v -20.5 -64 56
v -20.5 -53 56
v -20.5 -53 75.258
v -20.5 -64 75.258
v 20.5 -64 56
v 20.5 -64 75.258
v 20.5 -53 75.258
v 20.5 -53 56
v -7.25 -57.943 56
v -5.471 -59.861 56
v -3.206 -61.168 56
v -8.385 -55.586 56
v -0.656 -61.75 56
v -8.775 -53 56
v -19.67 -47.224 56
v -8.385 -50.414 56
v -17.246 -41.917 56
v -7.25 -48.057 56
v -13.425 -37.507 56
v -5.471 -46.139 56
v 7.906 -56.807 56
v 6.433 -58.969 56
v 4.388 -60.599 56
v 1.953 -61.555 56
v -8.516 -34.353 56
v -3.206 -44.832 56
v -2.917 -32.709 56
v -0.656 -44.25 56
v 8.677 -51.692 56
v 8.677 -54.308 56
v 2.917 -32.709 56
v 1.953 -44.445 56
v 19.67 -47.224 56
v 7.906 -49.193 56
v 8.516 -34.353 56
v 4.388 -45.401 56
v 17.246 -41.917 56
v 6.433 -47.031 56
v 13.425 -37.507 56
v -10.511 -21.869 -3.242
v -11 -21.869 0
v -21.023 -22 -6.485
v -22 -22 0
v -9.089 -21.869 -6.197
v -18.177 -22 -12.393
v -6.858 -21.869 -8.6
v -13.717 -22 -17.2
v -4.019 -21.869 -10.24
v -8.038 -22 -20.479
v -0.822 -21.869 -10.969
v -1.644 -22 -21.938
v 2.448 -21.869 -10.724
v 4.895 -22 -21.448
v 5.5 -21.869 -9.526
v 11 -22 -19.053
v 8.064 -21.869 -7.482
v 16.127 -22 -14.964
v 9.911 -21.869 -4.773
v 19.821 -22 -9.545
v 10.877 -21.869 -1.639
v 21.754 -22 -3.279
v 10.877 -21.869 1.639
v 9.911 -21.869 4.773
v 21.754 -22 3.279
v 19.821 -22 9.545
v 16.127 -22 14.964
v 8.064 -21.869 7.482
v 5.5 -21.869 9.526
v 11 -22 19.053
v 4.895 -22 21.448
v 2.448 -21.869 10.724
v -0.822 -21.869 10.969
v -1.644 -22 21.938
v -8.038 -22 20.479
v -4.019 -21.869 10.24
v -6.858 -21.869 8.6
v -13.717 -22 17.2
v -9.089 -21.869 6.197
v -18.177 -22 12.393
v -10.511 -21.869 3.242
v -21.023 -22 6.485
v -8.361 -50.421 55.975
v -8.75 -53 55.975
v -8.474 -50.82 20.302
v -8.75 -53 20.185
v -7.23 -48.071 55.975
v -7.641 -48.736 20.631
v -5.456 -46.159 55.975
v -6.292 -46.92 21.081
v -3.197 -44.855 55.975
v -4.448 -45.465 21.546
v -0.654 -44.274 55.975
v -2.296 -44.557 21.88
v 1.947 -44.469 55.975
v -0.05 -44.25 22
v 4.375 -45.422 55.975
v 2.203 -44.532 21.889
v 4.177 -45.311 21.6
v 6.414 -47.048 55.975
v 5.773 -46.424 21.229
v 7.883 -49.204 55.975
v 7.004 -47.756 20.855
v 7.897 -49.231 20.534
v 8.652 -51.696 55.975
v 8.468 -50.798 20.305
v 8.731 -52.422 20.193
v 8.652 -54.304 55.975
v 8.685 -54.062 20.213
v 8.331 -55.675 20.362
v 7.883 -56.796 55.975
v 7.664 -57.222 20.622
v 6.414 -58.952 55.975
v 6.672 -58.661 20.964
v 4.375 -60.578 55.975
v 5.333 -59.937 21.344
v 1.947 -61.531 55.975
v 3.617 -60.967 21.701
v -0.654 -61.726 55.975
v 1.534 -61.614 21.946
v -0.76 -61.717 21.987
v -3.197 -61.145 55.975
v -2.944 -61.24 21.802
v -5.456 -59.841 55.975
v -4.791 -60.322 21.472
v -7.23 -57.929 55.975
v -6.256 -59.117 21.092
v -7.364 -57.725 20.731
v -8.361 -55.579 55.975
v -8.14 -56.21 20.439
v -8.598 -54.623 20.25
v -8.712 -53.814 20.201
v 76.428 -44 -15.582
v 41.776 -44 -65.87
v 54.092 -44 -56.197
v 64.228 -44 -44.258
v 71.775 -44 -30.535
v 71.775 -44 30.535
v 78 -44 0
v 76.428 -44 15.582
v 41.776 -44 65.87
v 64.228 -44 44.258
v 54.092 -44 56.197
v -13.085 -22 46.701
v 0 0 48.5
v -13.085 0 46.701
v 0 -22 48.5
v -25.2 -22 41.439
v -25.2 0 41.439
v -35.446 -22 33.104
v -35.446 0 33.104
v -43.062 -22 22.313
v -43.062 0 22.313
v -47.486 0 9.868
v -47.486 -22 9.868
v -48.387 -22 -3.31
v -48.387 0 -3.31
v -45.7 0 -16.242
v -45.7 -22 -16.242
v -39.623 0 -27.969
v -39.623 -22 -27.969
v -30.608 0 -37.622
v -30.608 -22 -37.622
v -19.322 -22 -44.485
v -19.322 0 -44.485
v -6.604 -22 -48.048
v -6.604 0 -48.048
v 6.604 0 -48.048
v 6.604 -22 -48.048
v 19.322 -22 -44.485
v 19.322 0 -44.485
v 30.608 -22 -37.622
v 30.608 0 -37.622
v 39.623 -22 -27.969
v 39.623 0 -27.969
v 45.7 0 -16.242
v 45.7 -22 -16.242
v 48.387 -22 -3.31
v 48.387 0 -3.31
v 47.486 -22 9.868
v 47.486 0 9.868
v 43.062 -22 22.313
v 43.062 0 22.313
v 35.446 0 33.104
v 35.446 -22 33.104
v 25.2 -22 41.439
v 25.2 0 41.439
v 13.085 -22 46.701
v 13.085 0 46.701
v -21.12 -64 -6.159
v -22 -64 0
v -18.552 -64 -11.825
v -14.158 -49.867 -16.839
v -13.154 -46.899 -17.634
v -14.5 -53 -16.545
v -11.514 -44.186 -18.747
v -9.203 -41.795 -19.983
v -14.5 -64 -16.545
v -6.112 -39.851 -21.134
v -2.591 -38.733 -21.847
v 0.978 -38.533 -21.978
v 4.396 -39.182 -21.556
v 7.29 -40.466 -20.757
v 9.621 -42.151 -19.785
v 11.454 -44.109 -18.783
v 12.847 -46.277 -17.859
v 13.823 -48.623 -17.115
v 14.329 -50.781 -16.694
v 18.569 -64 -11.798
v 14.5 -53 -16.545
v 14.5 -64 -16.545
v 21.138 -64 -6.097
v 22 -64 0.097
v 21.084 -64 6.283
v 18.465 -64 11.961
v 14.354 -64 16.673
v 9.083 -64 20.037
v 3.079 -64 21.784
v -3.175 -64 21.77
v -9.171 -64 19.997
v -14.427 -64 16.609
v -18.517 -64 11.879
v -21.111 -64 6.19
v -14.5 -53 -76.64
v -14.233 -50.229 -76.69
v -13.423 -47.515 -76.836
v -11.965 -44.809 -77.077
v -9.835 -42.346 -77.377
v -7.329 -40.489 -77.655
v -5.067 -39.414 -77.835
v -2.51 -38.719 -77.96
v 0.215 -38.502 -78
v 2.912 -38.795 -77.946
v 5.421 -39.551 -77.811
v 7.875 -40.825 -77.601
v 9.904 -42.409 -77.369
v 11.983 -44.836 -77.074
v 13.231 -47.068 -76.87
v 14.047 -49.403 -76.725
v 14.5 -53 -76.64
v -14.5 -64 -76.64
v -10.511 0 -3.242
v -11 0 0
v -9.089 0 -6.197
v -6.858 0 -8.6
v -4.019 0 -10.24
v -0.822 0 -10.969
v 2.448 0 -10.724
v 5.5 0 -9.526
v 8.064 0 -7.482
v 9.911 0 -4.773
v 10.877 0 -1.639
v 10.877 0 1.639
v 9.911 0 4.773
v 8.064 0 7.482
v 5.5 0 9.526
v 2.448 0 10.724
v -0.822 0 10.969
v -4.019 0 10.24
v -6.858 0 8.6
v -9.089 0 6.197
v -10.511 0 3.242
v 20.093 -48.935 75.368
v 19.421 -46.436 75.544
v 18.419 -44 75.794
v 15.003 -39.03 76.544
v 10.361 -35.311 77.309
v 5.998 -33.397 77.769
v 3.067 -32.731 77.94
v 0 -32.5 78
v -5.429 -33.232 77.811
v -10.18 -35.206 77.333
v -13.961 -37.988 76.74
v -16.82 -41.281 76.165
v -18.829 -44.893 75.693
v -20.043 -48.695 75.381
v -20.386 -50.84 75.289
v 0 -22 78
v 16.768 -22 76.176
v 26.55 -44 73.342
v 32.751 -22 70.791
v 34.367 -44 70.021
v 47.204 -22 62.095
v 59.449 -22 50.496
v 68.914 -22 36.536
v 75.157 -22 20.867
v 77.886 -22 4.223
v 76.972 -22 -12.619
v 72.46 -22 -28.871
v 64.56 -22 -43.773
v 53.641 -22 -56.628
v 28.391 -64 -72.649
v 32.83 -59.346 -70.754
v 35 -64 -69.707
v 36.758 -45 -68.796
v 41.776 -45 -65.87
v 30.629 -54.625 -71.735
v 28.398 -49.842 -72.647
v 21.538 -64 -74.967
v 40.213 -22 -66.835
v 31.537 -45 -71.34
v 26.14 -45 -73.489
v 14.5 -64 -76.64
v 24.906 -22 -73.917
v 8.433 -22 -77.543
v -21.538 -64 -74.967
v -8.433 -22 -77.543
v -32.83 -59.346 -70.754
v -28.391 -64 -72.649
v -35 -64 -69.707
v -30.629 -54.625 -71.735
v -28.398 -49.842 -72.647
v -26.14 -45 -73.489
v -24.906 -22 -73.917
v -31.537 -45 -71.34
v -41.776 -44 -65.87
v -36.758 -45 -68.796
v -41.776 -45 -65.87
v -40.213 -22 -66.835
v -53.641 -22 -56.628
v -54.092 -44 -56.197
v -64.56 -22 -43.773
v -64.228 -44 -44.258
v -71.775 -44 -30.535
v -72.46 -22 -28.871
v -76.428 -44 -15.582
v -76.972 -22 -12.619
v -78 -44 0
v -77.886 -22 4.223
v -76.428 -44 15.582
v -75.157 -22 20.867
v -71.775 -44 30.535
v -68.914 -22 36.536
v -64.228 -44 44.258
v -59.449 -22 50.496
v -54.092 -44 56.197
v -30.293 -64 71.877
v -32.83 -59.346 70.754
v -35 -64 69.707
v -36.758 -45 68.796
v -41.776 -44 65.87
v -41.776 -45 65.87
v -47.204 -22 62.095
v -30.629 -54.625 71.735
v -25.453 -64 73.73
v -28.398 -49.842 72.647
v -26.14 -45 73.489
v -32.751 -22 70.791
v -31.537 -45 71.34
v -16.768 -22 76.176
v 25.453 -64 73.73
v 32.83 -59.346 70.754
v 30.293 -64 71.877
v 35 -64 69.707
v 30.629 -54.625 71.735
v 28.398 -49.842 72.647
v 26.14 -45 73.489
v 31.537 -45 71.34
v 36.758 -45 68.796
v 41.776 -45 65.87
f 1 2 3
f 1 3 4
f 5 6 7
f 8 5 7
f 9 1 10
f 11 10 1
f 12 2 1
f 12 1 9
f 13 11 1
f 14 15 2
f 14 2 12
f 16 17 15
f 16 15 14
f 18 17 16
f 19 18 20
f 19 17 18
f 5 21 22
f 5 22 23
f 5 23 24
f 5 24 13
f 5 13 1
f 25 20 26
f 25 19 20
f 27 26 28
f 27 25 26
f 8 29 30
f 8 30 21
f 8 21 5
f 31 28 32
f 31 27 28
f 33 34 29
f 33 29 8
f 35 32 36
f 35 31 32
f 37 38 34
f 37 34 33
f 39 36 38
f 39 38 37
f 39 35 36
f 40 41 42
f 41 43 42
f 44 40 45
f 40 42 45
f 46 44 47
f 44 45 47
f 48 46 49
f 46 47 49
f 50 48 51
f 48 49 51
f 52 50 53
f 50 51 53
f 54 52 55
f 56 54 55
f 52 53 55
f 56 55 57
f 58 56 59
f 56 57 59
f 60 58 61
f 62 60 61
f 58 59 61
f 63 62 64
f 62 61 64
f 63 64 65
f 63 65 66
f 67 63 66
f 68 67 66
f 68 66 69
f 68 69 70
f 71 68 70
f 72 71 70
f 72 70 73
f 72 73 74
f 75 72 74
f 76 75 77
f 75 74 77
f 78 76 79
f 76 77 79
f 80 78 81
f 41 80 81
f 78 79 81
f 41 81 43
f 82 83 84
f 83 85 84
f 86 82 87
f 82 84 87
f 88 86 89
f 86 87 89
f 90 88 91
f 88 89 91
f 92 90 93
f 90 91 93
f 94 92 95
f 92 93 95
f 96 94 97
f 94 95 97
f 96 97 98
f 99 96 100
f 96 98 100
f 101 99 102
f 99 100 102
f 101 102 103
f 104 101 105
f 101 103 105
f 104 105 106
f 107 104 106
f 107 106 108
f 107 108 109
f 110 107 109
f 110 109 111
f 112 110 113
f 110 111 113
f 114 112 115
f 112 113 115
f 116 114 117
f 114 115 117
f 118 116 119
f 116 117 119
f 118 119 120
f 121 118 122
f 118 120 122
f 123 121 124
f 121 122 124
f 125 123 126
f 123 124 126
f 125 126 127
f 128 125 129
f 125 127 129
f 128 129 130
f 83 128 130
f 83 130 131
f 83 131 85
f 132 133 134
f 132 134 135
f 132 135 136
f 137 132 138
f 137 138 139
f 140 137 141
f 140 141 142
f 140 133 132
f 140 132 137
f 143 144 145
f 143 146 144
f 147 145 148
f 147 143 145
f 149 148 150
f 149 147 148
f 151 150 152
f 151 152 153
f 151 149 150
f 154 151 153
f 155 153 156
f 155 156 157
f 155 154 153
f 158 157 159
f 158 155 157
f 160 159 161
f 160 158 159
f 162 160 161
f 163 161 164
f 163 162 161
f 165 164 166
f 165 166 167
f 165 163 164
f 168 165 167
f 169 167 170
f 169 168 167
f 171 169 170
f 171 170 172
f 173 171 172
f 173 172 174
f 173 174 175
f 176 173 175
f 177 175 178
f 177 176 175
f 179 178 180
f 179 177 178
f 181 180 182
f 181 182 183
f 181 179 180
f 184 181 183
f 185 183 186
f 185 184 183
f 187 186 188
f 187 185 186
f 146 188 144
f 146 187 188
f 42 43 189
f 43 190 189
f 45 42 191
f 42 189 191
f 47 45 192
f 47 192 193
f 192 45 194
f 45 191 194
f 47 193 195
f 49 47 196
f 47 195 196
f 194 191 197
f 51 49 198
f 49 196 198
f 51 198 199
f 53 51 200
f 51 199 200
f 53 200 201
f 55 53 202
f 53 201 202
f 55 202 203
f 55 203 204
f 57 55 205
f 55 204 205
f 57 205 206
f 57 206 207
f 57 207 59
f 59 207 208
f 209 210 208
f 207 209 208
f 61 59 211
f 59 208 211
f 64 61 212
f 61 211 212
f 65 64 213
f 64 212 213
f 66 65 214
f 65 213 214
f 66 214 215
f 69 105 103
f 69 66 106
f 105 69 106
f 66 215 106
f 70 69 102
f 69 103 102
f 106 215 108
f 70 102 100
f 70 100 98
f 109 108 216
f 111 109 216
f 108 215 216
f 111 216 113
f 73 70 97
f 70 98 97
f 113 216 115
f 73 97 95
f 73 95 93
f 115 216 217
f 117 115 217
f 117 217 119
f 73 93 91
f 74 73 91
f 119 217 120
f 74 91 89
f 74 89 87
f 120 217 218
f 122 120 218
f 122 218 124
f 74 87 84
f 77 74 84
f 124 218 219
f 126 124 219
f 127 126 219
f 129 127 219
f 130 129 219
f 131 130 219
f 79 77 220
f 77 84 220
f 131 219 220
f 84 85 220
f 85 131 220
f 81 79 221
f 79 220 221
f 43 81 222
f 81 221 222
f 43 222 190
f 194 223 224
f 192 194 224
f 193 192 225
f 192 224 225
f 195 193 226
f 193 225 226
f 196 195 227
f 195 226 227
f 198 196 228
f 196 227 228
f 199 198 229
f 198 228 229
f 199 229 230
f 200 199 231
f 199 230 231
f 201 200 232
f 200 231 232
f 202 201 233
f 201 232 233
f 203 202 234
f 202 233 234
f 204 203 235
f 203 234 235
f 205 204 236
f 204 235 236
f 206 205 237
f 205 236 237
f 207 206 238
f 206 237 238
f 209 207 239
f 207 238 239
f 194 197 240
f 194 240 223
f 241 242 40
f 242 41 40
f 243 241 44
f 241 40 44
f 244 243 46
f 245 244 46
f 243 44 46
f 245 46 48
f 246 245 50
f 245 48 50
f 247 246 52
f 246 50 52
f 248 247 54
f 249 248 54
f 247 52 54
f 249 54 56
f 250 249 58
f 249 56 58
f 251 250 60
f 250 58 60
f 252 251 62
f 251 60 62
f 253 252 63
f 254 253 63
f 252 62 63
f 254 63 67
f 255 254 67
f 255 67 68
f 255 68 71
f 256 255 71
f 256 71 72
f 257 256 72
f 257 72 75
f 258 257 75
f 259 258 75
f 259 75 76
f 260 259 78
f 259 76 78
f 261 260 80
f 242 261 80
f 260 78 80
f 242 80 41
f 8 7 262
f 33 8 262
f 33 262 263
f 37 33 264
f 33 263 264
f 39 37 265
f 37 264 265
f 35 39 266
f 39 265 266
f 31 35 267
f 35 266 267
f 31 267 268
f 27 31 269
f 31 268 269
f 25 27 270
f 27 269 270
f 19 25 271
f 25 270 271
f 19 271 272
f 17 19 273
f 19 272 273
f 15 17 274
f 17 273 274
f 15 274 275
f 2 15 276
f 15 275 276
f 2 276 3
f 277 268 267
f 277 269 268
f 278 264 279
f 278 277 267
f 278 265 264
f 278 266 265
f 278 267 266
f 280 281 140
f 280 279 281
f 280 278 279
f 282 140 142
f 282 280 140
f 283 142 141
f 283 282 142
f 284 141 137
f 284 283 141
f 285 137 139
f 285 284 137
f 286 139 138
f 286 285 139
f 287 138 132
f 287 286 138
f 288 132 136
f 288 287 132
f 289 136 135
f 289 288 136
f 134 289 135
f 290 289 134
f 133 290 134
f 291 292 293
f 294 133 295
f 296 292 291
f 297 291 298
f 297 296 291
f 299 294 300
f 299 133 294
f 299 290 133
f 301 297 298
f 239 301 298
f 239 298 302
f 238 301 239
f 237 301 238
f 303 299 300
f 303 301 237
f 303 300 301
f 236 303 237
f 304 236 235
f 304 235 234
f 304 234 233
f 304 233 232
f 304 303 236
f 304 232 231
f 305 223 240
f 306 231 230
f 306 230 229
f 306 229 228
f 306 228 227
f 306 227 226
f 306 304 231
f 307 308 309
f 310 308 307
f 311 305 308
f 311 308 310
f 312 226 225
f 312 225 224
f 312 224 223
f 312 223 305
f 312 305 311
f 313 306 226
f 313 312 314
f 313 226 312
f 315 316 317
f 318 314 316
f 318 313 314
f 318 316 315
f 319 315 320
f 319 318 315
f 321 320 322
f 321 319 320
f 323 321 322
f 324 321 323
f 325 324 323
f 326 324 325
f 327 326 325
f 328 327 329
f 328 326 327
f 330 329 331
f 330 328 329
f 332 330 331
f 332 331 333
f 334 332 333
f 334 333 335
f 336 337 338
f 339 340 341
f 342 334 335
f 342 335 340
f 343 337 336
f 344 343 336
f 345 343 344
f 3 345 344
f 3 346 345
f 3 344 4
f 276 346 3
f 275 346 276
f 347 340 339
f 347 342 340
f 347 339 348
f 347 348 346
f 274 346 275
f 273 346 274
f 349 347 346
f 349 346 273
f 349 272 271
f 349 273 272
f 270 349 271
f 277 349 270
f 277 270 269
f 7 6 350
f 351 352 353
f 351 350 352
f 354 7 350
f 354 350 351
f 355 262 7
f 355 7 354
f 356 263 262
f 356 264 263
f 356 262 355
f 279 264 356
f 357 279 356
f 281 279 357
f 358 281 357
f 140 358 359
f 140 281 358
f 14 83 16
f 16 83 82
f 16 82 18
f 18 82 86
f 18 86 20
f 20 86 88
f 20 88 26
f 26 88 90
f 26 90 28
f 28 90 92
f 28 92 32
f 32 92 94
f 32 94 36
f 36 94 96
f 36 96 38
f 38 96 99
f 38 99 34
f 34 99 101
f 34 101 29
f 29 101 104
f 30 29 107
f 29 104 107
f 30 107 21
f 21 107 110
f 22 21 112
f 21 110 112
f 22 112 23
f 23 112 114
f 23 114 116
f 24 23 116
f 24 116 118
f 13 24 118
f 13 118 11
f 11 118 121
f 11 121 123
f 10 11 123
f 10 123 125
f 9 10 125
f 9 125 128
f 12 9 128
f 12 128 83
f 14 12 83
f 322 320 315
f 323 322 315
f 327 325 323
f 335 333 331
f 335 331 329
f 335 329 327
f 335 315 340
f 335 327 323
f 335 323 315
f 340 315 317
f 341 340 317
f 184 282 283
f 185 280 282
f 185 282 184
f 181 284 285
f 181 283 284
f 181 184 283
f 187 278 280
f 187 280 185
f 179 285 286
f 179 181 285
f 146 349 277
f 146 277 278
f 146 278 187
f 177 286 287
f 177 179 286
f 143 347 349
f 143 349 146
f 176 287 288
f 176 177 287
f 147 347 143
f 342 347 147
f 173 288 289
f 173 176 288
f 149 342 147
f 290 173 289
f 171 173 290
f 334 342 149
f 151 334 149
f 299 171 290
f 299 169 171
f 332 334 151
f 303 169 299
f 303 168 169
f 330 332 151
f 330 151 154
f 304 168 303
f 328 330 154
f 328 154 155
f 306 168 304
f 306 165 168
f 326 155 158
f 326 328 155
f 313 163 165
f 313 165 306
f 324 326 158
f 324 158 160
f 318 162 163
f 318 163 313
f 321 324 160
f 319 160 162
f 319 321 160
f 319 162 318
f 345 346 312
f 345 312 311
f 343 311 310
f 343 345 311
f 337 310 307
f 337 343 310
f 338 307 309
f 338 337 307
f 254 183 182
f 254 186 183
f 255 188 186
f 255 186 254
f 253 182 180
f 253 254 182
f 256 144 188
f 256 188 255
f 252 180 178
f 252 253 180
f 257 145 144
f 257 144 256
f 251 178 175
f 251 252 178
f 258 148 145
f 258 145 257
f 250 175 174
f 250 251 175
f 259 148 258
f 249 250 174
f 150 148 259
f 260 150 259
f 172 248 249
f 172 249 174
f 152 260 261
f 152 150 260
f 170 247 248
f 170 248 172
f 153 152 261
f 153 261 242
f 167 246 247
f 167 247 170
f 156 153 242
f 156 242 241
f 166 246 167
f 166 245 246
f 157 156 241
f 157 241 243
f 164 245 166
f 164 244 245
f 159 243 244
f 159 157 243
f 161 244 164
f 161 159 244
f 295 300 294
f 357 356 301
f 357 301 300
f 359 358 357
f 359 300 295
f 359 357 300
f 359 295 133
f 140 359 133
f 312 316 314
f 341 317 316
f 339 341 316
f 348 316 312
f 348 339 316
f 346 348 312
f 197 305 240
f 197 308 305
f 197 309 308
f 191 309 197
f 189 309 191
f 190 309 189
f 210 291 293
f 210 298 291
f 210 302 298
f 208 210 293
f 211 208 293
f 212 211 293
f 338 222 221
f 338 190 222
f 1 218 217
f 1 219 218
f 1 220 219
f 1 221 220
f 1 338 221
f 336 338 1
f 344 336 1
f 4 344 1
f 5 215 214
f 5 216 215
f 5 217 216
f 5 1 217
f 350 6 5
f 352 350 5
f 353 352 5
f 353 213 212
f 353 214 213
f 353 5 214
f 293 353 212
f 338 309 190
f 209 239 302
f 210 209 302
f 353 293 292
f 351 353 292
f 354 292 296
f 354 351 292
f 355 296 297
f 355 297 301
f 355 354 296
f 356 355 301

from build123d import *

# Parameters (mm, degrees)
Y_KSEKLIK_EKSTR_ZYON2_REACH                  = 120.76
Y_KSEKLIK_EKSTR_ZYON2_END_RADIUS             = 78
Y_KSEKLIK_EKSTR_ZYON2_DIRECTION_2_REACH      = 120.76
Y_KSEKLIK_EKSTR_ZYON2_DIRECTION_2_END_RADIUS = 78
KES_EKSTR_ZYON1_DEPTH                        = 22
M16_BO_LUKLU_DELIK2_D                        = 17.5
M16_BO_LUKLU_DELIK2_DEPTH                    = 55.999
M16_BO_LUKLU_DELIK2_CSINK_D                  = 17.55
M16_BO_LUKLU_DELIK2_CSINK_ANGLE              = 90
M16_BO_LUKLU_DELIK2_TIP                      = 5.257530416
KES_EKSTR_ZYON2_REACH                        = 187.785
KES_EKSTR_ZYON2_END_RADIUS                   = 22


with BuildPart() as part:
    # Çizim1 → Döndür1 (revolve)
    with BuildSketch(Plane.XY):
        Polygon((0, 0), (48.5, 0), (48.5, -22), (78, -22), (78, -44), (0, -44), align=None)
    revolve(axis=Axis((0, 0, 0), (0, -1, 0)))

    # Yükseklik-Ekstrüzyon2: up to this cylinder (the profile starts inside it)
    y_kseklik_ekstr_zyon2_end = Plane(origin=(0, -54.257115, 0), z_dir=(0, 1, 0)) * Cylinder(Y_KSEKLIK_EKSTR_ZYON2_END_RADIUS, 398.52, mode=Mode.PRIVATE)
    # Çizim2 → Yükseklik-Ekstrüzyon2 (add, up to the surface)
    with BuildSketch(Plane.XY, mode=Mode.PRIVATE) as y_kseklik_ekstr_zyon2_sk1:
        Polygon((-35, -64), (35, -64), (26.140154495, -45), (41.775578503, -45), (41.775578503, -44), (-41.775578503, -44), (-41.775578503, -45), (-26.140154495, -45), align=None)
    y_kseklik_ekstr_zyon2_tool1 = extrude(y_kseklik_ekstr_zyon2_sk1.sketch, amount=Y_KSEKLIK_EKSTR_ZYON2_REACH, mode=Mode.PRIVATE) & y_kseklik_ekstr_zyon2_end
    add(y_kseklik_ekstr_zyon2_tool1.solids().sort_by_distance((0, -54.257115, 0))[0])

    # Yükseklik-Ekstrüzyon2 direction 2: up to this cylinder (the profile starts inside it)
    y_kseklik_ekstr_zyon2_direction_2_end = Plane(origin=(0, -54.257115, 0), z_dir=(0, 1, 0)) * Cylinder(Y_KSEKLIK_EKSTR_ZYON2_DIRECTION_2_END_RADIUS, 398.52, mode=Mode.PRIVATE)
    # Çizim2 → Yükseklik-Ekstrüzyon2 direction 2 (add, up to the surface)
    with BuildSketch(Plane.XY, mode=Mode.PRIVATE) as y_kseklik_ekstr_zyon2_direction_2_sk1:
        Polygon((-35, -64), (35, -64), (26.140154495, -45), (41.775578503, -45), (41.775578503, -44), (-41.775578503, -44), (-41.775578503, -45), (-26.140154495, -45), align=None)
    y_kseklik_ekstr_zyon2_direction_2_tool1 = extrude(y_kseklik_ekstr_zyon2_direction_2_sk1.sketch, amount=-Y_KSEKLIK_EKSTR_ZYON2_DIRECTION_2_REACH, mode=Mode.PRIVATE) & y_kseklik_ekstr_zyon2_direction_2_end
    add(y_kseklik_ekstr_zyon2_direction_2_tool1.solids().sort_by_distance((0, -54.257115, 0))[0])

    # Çizim4 → Kes-Döndür1 (revolve, cut)
    with BuildSketch(Plane.XY):
        Polygon((0, 0), (11, 0), (11, -21.868883424), (22, -22), (22, -64), (0, -64), align=None)
    revolve(axis=Axis((0, 0, 0), (0, -1, 0)), mode=Mode.SUBTRACT)

    # Çizim6 → Kes-Ekstrüzyon1 (cut)
    with BuildSketch(Plane.XY.offset(78)):
        with BuildLine():
            Line((-20.5, -53), (-20.5, -64))
            Line((-20.5, -64), (0, -64))
            Line((0, -64), (20.5, -64))
            Line((20.5, -64), (20.5, -53))
            ThreePointArc((20.5, -53), (0, -32.5), (-20.5, -53))
        make_face()
    extrude(amount=-KES_EKSTR_ZYON1_DEPTH, mode=Mode.SUBTRACT)

    # M16 Boşluklu Delik2
    with Locations(Plane(origin=(0, -53, 56), x_dir=(1, 0, 0), z_dir=(0, 0, 1))):
        with Locations((0, 0)):
            CounterSinkHole(M16_BO_LUKLU_DELIK2_D / 2, M16_BO_LUKLU_DELIK2_CSINK_D / 2, depth=M16_BO_LUKLU_DELIK2_DEPTH, counter_sink_angle=M16_BO_LUKLU_DELIK2_CSINK_ANGLE)
            with Locations((0, 0, -(M16_BO_LUKLU_DELIK2_DEPTH + M16_BO_LUKLU_DELIK2_TIP / 2))):  # 118° drill point
                Cone(0, M16_BO_LUKLU_DELIK2_D / 2, M16_BO_LUKLU_DELIK2_TIP, mode=Mode.SUBTRACT)

    # Kes-Ekstrüzyon2: up to this cylinder (the profile starts outside it)
    kes_ekstr_zyon2_end = Plane(origin=(0, -52.571949, 0), z_dir=(0, 1, 0)) * Cylinder(KES_EKSTR_ZYON2_END_RADIUS, 420.57, mode=Mode.PRIVATE)
    # Çizim10 → Kes-Ekstrüzyon2 (cut, up to the surface)
    with BuildSketch(Plane(origin=(0, 0, -78), x_dir=(-1, 0, 0), z_dir=(0, 0, -1)), mode=Mode.PRIVATE) as kes_ekstr_zyon2_sk1:
        with BuildLine():
            Line((-14.5, -53), (-14.5, -64))
            Line((-14.5, -64), (14.5, -64))
            Line((14.5, -64), (14.5, -53))
            ThreePointArc((14.5, -53), (0, -38.5), (-14.5, -53))
        make_face()
    kes_ekstr_zyon2_tool1 = extrude(kes_ekstr_zyon2_sk1.sketch, amount=-KES_EKSTR_ZYON2_REACH, mode=Mode.PRIVATE) - kes_ekstr_zyon2_end
    add(kes_ekstr_zyon2_tool1.solids().sort_by_distance((0, -52.571949, -78))[0], mode=Mode.SUBTRACT)


solid = part.part
